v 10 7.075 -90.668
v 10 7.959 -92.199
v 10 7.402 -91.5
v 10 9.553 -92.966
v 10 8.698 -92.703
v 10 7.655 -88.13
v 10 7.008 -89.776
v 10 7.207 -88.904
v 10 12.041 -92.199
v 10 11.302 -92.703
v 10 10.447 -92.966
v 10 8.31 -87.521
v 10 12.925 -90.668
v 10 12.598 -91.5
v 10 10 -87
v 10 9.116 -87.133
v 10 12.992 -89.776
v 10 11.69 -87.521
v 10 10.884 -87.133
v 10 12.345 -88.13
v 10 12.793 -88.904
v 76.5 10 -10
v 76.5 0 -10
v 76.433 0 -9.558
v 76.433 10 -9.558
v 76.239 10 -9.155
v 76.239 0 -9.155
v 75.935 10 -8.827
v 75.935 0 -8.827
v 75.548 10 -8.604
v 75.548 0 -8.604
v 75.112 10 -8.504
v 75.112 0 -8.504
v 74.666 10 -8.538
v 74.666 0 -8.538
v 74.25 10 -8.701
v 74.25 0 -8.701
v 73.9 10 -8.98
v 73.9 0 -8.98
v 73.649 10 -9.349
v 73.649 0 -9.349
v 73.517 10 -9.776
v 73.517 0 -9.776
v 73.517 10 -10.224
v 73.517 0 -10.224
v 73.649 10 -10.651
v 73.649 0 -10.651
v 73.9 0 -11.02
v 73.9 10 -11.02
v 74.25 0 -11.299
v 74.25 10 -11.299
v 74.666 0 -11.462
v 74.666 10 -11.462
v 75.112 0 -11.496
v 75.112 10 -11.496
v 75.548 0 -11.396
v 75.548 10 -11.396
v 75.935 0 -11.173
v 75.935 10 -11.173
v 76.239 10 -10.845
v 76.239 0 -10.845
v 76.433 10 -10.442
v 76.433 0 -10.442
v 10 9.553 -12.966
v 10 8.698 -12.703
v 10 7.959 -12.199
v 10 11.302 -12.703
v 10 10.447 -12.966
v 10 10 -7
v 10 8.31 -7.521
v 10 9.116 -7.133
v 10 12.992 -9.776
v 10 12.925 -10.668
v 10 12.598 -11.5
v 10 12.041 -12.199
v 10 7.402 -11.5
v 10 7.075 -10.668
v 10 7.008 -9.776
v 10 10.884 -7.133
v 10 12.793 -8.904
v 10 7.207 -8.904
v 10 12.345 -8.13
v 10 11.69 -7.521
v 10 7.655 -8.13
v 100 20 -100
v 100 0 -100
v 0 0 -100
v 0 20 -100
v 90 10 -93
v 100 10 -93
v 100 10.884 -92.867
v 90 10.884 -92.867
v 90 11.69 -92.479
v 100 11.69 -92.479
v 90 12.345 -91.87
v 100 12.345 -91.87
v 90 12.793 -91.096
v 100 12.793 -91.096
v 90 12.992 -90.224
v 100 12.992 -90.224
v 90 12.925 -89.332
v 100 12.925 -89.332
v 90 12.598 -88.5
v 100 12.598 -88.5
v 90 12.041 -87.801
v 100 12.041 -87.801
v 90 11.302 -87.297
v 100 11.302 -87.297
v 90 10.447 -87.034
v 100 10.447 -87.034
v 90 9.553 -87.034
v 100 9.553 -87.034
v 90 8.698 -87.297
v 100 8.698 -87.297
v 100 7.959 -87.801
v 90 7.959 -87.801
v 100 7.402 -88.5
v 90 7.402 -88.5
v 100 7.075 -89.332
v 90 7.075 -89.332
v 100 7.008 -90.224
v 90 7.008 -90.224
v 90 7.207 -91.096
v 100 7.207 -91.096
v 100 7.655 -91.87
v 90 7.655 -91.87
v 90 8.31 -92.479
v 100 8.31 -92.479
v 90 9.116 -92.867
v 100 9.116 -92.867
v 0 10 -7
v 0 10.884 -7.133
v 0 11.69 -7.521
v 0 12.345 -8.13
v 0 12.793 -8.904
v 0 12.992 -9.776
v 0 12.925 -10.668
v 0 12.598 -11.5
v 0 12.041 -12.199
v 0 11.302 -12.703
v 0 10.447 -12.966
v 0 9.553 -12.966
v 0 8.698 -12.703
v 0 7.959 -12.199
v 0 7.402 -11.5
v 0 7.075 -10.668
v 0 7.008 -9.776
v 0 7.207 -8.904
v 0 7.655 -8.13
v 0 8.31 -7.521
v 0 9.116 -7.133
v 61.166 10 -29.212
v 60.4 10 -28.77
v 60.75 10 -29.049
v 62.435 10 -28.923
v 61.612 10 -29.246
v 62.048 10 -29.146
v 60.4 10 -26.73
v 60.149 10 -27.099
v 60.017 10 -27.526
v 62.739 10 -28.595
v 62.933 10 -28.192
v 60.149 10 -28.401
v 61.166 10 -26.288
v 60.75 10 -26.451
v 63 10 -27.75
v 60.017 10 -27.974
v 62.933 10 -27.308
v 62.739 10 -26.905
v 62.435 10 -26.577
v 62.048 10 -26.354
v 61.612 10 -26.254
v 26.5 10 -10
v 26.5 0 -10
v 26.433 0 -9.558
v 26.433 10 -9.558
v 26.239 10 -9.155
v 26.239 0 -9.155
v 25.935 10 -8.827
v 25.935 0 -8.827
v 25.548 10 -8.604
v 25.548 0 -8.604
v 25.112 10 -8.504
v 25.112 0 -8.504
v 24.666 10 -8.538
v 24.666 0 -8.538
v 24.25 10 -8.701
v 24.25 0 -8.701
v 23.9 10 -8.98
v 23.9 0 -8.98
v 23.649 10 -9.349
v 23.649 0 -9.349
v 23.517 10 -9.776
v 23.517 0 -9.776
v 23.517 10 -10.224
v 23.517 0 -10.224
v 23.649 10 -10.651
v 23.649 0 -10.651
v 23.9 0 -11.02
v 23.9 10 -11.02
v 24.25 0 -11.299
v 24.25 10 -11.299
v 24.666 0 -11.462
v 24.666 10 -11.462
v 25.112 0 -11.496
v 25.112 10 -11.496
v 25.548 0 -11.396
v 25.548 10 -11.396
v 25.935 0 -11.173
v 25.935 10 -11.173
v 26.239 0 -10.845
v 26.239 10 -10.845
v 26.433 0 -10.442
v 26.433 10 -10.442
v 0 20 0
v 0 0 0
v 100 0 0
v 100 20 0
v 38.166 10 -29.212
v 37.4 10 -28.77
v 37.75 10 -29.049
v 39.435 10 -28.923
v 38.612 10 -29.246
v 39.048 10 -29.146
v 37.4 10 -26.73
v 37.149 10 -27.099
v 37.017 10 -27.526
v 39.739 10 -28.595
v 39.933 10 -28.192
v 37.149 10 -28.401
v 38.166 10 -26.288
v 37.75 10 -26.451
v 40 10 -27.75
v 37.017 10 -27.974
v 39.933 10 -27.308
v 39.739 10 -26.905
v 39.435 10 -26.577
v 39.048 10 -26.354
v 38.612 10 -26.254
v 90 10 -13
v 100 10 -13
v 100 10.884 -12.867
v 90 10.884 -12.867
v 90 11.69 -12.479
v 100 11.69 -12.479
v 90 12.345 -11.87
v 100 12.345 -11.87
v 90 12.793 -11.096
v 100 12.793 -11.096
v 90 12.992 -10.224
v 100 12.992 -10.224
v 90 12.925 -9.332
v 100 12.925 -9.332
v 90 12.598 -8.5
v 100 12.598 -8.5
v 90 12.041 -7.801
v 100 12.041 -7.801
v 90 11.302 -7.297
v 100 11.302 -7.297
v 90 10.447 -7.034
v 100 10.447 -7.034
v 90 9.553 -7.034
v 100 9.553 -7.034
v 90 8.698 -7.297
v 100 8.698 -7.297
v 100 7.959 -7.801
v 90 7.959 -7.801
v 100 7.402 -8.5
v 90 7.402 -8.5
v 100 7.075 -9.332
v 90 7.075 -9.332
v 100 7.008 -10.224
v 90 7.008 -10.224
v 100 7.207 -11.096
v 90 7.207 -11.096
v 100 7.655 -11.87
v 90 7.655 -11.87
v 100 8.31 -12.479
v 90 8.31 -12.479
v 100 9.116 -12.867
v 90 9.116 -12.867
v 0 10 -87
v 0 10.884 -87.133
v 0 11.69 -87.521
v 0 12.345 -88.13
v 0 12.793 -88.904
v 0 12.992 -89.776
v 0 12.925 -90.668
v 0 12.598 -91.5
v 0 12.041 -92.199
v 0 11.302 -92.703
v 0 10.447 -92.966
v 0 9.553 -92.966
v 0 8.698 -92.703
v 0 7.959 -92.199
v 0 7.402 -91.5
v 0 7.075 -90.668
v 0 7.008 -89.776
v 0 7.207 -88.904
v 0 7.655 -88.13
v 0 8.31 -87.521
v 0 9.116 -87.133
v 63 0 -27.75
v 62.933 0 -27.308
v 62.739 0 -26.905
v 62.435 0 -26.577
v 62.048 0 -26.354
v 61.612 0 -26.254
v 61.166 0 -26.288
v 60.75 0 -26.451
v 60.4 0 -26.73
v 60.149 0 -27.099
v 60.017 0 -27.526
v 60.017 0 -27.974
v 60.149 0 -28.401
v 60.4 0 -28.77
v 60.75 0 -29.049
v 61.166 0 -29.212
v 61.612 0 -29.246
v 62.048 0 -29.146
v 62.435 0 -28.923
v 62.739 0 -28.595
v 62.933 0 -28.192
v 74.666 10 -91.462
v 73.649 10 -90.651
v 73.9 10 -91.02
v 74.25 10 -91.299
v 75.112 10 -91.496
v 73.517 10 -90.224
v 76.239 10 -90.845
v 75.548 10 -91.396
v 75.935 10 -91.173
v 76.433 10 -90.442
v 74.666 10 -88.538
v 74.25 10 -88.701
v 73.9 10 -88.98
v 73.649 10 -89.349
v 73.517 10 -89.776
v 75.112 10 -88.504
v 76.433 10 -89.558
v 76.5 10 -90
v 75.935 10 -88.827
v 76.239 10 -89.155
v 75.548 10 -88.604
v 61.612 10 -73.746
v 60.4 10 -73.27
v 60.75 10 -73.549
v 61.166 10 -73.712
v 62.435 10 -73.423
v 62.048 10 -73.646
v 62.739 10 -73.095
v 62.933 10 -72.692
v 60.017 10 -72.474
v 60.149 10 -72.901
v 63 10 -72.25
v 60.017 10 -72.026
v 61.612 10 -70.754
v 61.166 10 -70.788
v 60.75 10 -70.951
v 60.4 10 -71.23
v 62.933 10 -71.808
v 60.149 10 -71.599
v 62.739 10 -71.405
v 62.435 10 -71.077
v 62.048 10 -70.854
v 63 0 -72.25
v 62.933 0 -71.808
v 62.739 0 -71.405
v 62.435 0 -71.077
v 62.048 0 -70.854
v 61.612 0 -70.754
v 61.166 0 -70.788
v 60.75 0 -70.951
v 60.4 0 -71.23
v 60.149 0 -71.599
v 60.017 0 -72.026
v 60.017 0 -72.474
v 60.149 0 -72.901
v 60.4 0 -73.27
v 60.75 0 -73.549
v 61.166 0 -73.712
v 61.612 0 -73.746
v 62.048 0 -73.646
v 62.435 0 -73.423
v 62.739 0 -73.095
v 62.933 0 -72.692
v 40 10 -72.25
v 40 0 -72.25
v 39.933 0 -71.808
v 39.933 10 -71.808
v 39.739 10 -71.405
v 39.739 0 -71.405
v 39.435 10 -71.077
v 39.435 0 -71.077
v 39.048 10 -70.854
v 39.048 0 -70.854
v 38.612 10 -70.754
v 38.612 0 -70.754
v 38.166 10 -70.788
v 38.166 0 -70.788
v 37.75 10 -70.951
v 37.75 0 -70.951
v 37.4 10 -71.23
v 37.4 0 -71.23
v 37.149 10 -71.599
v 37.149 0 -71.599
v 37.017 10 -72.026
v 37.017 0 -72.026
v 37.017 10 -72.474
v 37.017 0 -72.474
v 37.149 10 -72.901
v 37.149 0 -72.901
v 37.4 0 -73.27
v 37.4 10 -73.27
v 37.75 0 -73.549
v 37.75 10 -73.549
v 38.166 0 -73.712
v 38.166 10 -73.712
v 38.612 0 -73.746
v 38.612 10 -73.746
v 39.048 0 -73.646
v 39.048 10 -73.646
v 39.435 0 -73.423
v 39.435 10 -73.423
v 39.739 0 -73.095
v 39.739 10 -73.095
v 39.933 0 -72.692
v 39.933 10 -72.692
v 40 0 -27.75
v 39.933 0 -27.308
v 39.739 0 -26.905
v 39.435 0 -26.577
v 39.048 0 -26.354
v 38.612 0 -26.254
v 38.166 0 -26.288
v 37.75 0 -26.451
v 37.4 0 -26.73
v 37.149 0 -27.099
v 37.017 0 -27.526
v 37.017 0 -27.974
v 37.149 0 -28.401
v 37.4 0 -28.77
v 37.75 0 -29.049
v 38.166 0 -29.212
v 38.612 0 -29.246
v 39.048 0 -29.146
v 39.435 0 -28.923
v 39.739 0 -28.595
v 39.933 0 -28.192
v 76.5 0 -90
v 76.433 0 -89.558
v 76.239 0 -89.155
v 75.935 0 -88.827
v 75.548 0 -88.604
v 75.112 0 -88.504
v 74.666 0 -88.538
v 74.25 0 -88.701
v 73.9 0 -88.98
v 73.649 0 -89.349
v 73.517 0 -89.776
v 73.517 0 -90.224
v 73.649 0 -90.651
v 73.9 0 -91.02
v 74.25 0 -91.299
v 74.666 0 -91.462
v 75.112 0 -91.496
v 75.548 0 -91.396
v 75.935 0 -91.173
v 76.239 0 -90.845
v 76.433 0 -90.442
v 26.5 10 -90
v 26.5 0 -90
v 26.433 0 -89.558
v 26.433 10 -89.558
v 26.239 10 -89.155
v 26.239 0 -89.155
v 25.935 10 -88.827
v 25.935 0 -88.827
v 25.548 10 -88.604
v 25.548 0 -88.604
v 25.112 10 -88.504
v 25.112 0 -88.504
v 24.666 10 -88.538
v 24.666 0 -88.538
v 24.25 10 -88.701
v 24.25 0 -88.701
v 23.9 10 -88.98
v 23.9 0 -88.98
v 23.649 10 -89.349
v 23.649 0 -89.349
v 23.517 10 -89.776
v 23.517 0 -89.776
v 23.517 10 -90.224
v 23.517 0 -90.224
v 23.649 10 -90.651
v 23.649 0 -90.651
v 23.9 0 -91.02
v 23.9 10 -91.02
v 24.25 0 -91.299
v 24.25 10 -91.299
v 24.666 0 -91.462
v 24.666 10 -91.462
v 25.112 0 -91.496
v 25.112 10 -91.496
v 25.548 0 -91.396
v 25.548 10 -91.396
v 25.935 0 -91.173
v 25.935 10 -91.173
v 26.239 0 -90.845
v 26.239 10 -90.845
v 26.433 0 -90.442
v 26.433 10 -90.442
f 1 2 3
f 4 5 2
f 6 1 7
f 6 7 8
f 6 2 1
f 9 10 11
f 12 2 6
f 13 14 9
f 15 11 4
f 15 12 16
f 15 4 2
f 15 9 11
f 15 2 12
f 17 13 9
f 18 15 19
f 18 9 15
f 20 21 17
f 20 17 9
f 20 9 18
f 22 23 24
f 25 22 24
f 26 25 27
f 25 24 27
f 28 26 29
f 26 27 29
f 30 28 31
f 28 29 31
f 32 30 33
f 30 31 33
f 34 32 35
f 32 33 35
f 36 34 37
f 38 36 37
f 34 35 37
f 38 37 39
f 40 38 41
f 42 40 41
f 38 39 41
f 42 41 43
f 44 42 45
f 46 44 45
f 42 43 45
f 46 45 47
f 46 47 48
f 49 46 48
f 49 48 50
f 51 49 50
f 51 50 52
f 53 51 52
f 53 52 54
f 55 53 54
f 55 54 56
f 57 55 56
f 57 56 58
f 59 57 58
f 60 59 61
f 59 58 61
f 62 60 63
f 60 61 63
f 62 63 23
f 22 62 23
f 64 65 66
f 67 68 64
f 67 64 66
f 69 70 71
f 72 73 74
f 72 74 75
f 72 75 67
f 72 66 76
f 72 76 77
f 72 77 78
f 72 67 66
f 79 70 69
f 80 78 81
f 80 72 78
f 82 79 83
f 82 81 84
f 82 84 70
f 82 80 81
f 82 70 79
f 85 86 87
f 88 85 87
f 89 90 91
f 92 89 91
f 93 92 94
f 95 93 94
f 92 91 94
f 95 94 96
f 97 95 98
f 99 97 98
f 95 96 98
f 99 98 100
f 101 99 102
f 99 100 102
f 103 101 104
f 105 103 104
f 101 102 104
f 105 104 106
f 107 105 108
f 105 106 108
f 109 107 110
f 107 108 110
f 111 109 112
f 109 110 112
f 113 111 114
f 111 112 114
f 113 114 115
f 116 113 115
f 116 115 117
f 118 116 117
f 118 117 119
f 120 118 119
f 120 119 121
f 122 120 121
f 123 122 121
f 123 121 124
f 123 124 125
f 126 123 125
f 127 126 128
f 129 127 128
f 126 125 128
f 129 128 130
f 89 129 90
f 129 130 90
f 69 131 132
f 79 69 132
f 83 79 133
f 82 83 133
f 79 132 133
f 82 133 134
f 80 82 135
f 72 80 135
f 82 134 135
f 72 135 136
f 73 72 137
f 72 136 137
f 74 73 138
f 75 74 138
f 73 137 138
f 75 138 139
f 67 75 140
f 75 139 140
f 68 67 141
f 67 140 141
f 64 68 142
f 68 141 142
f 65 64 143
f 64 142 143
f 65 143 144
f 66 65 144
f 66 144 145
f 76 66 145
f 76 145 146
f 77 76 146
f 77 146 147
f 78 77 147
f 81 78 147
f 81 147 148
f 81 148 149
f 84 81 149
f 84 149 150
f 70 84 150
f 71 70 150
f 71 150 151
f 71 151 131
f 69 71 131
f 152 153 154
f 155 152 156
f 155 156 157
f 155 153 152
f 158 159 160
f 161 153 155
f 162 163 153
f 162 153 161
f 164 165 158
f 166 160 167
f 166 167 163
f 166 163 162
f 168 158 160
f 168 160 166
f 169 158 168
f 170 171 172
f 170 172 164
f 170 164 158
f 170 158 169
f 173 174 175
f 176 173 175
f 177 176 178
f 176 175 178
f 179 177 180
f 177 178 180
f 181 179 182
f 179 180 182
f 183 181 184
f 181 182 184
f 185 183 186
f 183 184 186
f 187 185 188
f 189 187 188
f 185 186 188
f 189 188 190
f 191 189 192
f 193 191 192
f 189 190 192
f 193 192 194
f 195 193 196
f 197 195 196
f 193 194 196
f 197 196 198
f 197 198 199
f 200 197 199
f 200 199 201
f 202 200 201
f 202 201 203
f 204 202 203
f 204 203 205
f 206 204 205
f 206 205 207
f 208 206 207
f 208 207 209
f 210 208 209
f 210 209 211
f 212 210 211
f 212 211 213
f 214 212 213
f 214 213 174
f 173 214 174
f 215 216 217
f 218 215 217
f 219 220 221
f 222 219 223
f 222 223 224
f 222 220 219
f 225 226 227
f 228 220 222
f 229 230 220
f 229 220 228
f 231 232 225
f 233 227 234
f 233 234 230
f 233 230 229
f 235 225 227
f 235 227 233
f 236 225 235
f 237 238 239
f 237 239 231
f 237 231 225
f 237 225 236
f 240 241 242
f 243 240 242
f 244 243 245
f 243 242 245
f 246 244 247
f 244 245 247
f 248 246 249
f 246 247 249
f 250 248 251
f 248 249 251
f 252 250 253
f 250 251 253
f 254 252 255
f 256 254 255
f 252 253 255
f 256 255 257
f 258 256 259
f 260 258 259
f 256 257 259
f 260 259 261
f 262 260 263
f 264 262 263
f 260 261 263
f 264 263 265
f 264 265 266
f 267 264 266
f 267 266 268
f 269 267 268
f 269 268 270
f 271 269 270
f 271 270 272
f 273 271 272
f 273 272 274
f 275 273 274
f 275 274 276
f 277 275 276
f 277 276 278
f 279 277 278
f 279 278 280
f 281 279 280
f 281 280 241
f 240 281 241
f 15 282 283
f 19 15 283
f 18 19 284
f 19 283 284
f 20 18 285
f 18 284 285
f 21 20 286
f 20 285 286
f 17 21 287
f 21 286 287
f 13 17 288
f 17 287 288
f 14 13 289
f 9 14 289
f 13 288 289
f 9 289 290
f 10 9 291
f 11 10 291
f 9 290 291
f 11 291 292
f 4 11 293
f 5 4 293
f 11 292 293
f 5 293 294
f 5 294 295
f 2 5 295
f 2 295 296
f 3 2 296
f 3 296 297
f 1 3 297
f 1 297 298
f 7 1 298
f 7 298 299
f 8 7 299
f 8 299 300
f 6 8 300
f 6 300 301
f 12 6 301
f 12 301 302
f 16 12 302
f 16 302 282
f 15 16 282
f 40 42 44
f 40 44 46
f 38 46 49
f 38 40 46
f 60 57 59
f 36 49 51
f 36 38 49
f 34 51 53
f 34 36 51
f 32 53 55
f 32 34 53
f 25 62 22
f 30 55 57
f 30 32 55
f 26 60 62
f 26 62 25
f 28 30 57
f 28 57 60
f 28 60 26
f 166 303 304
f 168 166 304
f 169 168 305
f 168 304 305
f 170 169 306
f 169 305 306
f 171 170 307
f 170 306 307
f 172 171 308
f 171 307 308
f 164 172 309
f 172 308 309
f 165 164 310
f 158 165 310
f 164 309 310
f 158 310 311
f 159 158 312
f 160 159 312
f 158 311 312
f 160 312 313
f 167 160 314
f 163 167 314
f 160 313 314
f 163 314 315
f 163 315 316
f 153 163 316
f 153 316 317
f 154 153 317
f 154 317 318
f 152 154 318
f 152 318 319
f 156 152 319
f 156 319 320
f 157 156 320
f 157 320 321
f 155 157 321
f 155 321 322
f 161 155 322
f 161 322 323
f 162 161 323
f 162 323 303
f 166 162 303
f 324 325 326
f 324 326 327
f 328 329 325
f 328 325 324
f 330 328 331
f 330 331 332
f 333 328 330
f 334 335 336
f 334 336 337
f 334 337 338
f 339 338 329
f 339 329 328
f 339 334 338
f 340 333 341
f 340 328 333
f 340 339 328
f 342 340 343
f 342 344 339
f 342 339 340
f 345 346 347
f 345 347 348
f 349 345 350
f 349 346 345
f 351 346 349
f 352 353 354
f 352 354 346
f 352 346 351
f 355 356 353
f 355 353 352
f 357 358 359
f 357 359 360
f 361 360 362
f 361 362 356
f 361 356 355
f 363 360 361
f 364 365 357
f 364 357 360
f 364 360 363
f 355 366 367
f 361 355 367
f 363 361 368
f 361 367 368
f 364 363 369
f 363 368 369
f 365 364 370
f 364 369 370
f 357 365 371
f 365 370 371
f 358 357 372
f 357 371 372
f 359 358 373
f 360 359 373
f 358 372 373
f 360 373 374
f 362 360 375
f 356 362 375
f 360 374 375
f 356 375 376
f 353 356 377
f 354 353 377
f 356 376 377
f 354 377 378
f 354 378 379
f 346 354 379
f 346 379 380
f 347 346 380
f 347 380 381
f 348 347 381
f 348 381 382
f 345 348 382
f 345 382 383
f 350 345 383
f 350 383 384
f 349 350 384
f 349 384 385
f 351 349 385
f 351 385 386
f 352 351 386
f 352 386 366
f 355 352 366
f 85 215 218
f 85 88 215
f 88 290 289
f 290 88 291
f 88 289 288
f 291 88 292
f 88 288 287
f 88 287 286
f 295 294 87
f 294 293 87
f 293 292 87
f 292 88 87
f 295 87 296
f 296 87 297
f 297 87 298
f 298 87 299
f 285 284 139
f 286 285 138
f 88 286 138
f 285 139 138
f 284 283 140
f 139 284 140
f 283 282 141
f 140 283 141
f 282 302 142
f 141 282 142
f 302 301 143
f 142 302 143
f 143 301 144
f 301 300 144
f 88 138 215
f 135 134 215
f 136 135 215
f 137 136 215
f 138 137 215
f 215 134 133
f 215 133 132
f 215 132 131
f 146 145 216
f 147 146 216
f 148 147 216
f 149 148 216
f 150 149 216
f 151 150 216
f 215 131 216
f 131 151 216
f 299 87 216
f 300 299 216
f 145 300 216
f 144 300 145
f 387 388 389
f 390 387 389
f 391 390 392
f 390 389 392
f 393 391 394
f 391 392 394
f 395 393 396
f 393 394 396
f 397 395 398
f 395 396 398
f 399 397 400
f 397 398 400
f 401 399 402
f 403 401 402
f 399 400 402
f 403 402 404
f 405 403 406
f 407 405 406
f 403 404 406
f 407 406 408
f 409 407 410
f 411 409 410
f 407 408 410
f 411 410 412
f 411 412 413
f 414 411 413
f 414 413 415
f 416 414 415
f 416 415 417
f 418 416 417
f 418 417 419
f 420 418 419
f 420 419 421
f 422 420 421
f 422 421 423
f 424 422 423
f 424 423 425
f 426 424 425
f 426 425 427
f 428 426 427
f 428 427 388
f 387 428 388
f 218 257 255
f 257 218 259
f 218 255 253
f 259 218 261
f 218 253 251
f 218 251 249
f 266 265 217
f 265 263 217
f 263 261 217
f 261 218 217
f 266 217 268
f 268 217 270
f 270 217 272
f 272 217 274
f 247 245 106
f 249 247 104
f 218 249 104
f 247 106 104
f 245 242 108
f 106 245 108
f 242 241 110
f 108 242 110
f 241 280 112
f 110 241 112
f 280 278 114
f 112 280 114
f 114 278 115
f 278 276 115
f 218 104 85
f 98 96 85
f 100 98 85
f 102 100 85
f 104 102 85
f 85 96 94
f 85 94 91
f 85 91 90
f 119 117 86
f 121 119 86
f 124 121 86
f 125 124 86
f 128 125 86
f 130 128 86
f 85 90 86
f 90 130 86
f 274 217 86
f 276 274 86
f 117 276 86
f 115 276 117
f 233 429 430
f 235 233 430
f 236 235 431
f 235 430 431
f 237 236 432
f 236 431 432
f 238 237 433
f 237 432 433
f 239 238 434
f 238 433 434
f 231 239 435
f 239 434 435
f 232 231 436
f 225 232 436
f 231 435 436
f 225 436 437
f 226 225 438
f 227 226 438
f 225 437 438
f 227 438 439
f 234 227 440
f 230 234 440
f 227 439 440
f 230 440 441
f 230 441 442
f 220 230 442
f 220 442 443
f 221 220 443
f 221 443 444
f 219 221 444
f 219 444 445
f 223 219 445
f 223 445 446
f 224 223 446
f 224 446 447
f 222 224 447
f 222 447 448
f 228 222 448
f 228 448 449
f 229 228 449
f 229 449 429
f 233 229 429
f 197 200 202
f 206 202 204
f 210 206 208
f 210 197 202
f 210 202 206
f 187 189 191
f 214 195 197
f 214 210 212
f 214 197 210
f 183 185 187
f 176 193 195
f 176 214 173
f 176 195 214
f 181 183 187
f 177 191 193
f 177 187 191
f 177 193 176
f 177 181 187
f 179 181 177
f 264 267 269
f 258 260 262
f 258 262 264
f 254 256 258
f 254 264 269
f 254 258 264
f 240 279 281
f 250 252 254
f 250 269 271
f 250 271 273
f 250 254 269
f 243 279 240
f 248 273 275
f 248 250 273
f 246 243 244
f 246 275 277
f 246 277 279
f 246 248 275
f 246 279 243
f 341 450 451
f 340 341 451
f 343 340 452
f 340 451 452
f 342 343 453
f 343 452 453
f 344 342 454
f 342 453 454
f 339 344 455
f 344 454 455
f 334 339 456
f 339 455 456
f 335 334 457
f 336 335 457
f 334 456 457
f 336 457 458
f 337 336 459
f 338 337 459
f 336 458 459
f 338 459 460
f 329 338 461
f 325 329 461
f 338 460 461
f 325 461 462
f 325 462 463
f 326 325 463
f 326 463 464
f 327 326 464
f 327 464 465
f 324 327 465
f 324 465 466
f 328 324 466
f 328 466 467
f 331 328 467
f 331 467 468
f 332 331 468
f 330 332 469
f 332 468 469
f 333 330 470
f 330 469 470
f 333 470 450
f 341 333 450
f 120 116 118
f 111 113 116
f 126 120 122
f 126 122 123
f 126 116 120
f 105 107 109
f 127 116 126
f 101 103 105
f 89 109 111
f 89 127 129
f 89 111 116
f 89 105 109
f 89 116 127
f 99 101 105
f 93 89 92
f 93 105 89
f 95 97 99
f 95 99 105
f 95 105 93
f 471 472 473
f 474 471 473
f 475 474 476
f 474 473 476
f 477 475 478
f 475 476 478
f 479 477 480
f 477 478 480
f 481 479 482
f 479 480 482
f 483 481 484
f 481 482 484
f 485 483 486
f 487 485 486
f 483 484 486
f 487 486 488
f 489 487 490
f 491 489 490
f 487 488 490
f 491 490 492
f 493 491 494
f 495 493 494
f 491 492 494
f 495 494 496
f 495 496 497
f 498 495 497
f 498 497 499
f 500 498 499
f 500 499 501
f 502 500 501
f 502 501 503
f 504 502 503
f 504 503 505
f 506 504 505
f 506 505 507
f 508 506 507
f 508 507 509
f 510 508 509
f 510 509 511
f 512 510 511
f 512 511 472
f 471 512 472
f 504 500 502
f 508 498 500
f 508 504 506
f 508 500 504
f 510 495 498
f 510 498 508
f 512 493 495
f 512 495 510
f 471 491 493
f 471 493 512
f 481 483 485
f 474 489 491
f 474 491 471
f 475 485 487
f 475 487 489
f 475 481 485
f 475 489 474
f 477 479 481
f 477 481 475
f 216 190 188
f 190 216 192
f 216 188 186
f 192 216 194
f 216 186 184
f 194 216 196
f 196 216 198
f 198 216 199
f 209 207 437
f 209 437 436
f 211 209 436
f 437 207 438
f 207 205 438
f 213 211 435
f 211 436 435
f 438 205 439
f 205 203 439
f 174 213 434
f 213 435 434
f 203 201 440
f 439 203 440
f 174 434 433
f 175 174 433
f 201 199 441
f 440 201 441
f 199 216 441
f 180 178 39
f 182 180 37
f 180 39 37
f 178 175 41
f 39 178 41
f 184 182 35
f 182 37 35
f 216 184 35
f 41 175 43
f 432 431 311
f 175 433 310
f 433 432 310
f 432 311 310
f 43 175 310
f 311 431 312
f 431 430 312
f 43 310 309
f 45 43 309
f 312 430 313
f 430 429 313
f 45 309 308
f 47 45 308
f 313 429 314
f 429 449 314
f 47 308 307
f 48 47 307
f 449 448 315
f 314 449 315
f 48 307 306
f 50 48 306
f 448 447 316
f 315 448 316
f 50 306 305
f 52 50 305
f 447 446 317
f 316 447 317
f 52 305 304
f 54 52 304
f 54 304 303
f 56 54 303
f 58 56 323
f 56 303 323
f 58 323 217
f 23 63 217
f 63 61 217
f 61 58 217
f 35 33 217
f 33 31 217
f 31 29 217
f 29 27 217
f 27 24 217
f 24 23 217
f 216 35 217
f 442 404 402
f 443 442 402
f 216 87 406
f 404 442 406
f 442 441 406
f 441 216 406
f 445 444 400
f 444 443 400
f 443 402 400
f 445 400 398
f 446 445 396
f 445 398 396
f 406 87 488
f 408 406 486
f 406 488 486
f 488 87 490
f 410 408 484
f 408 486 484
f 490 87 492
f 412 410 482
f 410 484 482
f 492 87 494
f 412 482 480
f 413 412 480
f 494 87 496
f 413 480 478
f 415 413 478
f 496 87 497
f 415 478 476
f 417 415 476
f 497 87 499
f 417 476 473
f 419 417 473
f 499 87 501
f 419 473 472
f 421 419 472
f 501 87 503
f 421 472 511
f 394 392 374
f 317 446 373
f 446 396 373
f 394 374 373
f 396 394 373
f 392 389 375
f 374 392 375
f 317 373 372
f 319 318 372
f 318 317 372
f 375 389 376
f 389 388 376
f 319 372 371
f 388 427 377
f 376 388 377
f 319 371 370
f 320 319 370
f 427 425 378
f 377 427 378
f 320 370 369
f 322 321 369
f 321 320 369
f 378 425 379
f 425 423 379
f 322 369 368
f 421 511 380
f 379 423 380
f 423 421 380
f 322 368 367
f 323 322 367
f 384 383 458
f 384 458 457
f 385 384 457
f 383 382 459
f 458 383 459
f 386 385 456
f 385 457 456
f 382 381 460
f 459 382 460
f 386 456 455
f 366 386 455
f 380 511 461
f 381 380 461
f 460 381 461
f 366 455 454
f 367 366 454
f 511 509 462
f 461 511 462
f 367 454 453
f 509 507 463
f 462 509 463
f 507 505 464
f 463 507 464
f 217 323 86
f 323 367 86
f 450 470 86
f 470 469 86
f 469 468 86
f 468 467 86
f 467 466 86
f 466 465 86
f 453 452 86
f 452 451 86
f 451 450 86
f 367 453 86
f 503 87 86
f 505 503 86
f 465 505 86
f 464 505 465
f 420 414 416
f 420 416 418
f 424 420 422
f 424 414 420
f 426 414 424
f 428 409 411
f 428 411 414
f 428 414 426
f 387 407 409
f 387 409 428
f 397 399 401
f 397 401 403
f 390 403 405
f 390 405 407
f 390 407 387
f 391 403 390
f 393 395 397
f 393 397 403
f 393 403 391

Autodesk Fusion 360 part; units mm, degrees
sketch "Esquisse1" plane through (0, 0, 0) normal (0, 1, 0) x (1, 0, 0)
  line L0 (0, 0) -> (100, 0)
  line L1 (100, 0) -> (100, 100)
  line L2 (100, 100) -> (0, 100)
  line L3 (0, 100) -> (0, 0)
  dimension "d1" = 100
  dimension "d2" = 100
extrude "Extrusion1" add sketch "Esquisse1" along normal blind 20
sketch "Esquisse2" plane through (100, 0, 0) normal (1, 0, 0) x (0, 0, -1)
  line L0 (0, 0) -> (100, 0)
  line L1 (100, 0) -> (100, 20)
  line L2 (100, 20) -> (0, 20)
  line L3 (0, 20) -> (0, 0)
  line L4 (0, 10) -> (37, 10)
  circle A0 centre (10, 10) radius 3
  line L5 (50, 20) -> (50, 0)
  circle A1 centre (90, 10) radius 3
  dimension "d5" = 6
  dimension "d6" = 10
extrude "Extrusion2" cut sketch "Esquisse2" against normal blind 10 contours L4 A0 | L4 A0 | A1
sketch "Esquisse3" plane through (0, 0, 0) normal (-1, 0, 0) x (0, 0, 1)
  line L0 (-100, 0) -> (0, 0)
  line L1 (0, 0) -> (0, 20)
  line L2 (0, 20) -> (-100, 20)
  line L3 (-100, 20) -> (-100, 0)
  line L4 (-100, 10) -> (-70, 10)
  line L5 (-50, 20) -> (-50, 0)
  circle A0 centre (-90, 10) radius 3
  circle A1 centre (-10, 10) radius 3
  dimension "d9" = 6
  dimension "d10" = 10
extrude "Extrusion3" cut sketch "Esquisse3" against normal blind 10 contours L4 A0 | L4 A0 | A1
sketch "Esquisse4" plane through (0, 0, 0) normal (0, -1, 0) x (1, 0, 0)
  line L0 (0, 0) -> (0, -100)
  line L1 (0, -100) -> (100, -100)
  line L2 (100, -100) -> (100, 0)
  line L3 (100, 0) -> (0, 0)
  line L4 (0, -5) -> (20, -5)
  line L5 (20, -5) -> (20, 0)
  line L6 (80, 0) -> (80, -5)
  line L7 (80, -5) -> (100, -5)
  line L8 (0, -95) -> (20, -95)
  line L9 (20, -95) -> (20, -100)
  line L10 (80, -100) -> (80, -95)
  line L11 (80, -95) -> (100, -95)
  line L12 (20, -5) -> (80, -5)
  line L13 (80, -95) -> (20, -95)
  line L14 (20, -95) -> (20, -5)
  line L15 (80, -5) -> (80, -95)
  line L16 (20, -90) -> (25, -90)
  line L17 (25, -90) -> (25, -95)
  line L18 (80, -90) -> (75, -90)
  line L19 (75, -90) -> (75, -95)
  circle A0 centre (25, -90) radius 1.5
  circle A1 centre (75, -90) radius 1.5
  line L20 (20, -10) -> (25, -10)
  line L21 (25, -10) -> (25, -5)
  line L22 (75, -5) -> (75, -10)
  line L23 (75, -10) -> (80, -10)
  circle A2 centre (25, -10) radius 1.5
  circle A3 centre (75, -10) radius 1.5
  line L24 (35.75, -100) -> (35.75, -75)
  line L25 (35.75, -75) -> (0, -75)
  line L26 (35.75, 0) -> (35.75, -25)
  line L27 (35.75, -25) -> (0, -25)
  line L28 (64.25, 0) -> (64.25, -25)
  line L29 (64.25, -25) -> (100, -25)
  line L30 (100, -75) -> (64.25, -75)
  line L31 (64.25, -75) -> (64.25, -100)
  line L32 (64.25, -75) -> (35.75, -75)
  line L33 (35.75, -75) -> (35.75, -25)
  line L34 (35.75, -25) -> (64.25, -25)
  line L35 (64.25, -25) -> (64.25, -75)
  line L36 (61.5, -75) -> (61.5, -72.25)
  line L37 (61.5, -72.25) -> (64.25, -72.25)
  line L38 (38.5, -75) -> (38.5, -72.25)
  line L39 (38.5, -72.25) -> (35.75, -72.25)
  line L40 (38.5, -25) -> (38.5, -27.75)
  line L41 (38.5, -27.75) -> (35.75, -27.75)
  line L42 (61.5, -25) -> (61.5, -27.75)
  line L43 (61.5, -27.75) -> (64.25, -27.75)
  circle A4 centre (38.5, -72.25) radius 1.5
  circle A5 centre (61.5, -72.25) radius 1.5
  circle A6 centre (38.5, -27.75) radius 1.5
  circle A7 centre (61.5, -27.75) radius 1.5
  dimension "d13" = 5
  dimension "d14" = 20
  dimension "d15" = 5
  dimension "d16" = 20
  dimension "d17" = 20
  dimension "d18" = 20
  dimension "d19" = 5
  dimension "d20" = 5
  dimension "d21" = 5
  dimension "d22" = 5
  dimension "d23" = 5
  dimension "d24" = 5
  dimension "d25" = 3
  dimension "d26" = 3
  dimension "d27" = 5
  dimension "d28" = 5
  dimension "d29" = 5
  dimension "d30" = 5
  dimension "d31" = 3
  dimension "d32" = 3
  dimension "d35" = 25
  dimension "d36" = 25
  dimension "d37" = 35.75
  dimension "d38" = 35.75
  dimension "d39" = 25
  dimension "d40" = 25
  dimension "d41" = 35.75
  dimension "d42" = 35.75
  dimension "d43" = 2.75
  dimension "d44" = 2.75
  dimension "d45" = 2.75
  dimension "d46" = 2.75
  dimension "d47" = 2.75
  dimension "d48" = 2.75
  dimension "d49" = 2.75
  dimension "d50" = 2.75
  dimension "d51" = 3
  dimension "d52" = 3
  dimension "d53" = 3
  dimension "d54" = 3
extrude "Extrusion4" cut sketch "Esquisse4" against normal blind 10 contours L20 L21 A2 | L20 L21 A2 | L16 L17 A0 | L16 L17 A0 | L22 L23 A3 | L22 L23 A3 | L18 L19 A1 | L18 L19 A1
extrude "Extrusion5" cut sketch "Esquisse4" against normal blind 10 contours L40 L41 A6 | L40 L41 A6 | L38 L39 A4 | L38 L39 A4 | L42 L43 A7 | L42 L43 A7 | L36 L37 A5 | L36 L37 A5
